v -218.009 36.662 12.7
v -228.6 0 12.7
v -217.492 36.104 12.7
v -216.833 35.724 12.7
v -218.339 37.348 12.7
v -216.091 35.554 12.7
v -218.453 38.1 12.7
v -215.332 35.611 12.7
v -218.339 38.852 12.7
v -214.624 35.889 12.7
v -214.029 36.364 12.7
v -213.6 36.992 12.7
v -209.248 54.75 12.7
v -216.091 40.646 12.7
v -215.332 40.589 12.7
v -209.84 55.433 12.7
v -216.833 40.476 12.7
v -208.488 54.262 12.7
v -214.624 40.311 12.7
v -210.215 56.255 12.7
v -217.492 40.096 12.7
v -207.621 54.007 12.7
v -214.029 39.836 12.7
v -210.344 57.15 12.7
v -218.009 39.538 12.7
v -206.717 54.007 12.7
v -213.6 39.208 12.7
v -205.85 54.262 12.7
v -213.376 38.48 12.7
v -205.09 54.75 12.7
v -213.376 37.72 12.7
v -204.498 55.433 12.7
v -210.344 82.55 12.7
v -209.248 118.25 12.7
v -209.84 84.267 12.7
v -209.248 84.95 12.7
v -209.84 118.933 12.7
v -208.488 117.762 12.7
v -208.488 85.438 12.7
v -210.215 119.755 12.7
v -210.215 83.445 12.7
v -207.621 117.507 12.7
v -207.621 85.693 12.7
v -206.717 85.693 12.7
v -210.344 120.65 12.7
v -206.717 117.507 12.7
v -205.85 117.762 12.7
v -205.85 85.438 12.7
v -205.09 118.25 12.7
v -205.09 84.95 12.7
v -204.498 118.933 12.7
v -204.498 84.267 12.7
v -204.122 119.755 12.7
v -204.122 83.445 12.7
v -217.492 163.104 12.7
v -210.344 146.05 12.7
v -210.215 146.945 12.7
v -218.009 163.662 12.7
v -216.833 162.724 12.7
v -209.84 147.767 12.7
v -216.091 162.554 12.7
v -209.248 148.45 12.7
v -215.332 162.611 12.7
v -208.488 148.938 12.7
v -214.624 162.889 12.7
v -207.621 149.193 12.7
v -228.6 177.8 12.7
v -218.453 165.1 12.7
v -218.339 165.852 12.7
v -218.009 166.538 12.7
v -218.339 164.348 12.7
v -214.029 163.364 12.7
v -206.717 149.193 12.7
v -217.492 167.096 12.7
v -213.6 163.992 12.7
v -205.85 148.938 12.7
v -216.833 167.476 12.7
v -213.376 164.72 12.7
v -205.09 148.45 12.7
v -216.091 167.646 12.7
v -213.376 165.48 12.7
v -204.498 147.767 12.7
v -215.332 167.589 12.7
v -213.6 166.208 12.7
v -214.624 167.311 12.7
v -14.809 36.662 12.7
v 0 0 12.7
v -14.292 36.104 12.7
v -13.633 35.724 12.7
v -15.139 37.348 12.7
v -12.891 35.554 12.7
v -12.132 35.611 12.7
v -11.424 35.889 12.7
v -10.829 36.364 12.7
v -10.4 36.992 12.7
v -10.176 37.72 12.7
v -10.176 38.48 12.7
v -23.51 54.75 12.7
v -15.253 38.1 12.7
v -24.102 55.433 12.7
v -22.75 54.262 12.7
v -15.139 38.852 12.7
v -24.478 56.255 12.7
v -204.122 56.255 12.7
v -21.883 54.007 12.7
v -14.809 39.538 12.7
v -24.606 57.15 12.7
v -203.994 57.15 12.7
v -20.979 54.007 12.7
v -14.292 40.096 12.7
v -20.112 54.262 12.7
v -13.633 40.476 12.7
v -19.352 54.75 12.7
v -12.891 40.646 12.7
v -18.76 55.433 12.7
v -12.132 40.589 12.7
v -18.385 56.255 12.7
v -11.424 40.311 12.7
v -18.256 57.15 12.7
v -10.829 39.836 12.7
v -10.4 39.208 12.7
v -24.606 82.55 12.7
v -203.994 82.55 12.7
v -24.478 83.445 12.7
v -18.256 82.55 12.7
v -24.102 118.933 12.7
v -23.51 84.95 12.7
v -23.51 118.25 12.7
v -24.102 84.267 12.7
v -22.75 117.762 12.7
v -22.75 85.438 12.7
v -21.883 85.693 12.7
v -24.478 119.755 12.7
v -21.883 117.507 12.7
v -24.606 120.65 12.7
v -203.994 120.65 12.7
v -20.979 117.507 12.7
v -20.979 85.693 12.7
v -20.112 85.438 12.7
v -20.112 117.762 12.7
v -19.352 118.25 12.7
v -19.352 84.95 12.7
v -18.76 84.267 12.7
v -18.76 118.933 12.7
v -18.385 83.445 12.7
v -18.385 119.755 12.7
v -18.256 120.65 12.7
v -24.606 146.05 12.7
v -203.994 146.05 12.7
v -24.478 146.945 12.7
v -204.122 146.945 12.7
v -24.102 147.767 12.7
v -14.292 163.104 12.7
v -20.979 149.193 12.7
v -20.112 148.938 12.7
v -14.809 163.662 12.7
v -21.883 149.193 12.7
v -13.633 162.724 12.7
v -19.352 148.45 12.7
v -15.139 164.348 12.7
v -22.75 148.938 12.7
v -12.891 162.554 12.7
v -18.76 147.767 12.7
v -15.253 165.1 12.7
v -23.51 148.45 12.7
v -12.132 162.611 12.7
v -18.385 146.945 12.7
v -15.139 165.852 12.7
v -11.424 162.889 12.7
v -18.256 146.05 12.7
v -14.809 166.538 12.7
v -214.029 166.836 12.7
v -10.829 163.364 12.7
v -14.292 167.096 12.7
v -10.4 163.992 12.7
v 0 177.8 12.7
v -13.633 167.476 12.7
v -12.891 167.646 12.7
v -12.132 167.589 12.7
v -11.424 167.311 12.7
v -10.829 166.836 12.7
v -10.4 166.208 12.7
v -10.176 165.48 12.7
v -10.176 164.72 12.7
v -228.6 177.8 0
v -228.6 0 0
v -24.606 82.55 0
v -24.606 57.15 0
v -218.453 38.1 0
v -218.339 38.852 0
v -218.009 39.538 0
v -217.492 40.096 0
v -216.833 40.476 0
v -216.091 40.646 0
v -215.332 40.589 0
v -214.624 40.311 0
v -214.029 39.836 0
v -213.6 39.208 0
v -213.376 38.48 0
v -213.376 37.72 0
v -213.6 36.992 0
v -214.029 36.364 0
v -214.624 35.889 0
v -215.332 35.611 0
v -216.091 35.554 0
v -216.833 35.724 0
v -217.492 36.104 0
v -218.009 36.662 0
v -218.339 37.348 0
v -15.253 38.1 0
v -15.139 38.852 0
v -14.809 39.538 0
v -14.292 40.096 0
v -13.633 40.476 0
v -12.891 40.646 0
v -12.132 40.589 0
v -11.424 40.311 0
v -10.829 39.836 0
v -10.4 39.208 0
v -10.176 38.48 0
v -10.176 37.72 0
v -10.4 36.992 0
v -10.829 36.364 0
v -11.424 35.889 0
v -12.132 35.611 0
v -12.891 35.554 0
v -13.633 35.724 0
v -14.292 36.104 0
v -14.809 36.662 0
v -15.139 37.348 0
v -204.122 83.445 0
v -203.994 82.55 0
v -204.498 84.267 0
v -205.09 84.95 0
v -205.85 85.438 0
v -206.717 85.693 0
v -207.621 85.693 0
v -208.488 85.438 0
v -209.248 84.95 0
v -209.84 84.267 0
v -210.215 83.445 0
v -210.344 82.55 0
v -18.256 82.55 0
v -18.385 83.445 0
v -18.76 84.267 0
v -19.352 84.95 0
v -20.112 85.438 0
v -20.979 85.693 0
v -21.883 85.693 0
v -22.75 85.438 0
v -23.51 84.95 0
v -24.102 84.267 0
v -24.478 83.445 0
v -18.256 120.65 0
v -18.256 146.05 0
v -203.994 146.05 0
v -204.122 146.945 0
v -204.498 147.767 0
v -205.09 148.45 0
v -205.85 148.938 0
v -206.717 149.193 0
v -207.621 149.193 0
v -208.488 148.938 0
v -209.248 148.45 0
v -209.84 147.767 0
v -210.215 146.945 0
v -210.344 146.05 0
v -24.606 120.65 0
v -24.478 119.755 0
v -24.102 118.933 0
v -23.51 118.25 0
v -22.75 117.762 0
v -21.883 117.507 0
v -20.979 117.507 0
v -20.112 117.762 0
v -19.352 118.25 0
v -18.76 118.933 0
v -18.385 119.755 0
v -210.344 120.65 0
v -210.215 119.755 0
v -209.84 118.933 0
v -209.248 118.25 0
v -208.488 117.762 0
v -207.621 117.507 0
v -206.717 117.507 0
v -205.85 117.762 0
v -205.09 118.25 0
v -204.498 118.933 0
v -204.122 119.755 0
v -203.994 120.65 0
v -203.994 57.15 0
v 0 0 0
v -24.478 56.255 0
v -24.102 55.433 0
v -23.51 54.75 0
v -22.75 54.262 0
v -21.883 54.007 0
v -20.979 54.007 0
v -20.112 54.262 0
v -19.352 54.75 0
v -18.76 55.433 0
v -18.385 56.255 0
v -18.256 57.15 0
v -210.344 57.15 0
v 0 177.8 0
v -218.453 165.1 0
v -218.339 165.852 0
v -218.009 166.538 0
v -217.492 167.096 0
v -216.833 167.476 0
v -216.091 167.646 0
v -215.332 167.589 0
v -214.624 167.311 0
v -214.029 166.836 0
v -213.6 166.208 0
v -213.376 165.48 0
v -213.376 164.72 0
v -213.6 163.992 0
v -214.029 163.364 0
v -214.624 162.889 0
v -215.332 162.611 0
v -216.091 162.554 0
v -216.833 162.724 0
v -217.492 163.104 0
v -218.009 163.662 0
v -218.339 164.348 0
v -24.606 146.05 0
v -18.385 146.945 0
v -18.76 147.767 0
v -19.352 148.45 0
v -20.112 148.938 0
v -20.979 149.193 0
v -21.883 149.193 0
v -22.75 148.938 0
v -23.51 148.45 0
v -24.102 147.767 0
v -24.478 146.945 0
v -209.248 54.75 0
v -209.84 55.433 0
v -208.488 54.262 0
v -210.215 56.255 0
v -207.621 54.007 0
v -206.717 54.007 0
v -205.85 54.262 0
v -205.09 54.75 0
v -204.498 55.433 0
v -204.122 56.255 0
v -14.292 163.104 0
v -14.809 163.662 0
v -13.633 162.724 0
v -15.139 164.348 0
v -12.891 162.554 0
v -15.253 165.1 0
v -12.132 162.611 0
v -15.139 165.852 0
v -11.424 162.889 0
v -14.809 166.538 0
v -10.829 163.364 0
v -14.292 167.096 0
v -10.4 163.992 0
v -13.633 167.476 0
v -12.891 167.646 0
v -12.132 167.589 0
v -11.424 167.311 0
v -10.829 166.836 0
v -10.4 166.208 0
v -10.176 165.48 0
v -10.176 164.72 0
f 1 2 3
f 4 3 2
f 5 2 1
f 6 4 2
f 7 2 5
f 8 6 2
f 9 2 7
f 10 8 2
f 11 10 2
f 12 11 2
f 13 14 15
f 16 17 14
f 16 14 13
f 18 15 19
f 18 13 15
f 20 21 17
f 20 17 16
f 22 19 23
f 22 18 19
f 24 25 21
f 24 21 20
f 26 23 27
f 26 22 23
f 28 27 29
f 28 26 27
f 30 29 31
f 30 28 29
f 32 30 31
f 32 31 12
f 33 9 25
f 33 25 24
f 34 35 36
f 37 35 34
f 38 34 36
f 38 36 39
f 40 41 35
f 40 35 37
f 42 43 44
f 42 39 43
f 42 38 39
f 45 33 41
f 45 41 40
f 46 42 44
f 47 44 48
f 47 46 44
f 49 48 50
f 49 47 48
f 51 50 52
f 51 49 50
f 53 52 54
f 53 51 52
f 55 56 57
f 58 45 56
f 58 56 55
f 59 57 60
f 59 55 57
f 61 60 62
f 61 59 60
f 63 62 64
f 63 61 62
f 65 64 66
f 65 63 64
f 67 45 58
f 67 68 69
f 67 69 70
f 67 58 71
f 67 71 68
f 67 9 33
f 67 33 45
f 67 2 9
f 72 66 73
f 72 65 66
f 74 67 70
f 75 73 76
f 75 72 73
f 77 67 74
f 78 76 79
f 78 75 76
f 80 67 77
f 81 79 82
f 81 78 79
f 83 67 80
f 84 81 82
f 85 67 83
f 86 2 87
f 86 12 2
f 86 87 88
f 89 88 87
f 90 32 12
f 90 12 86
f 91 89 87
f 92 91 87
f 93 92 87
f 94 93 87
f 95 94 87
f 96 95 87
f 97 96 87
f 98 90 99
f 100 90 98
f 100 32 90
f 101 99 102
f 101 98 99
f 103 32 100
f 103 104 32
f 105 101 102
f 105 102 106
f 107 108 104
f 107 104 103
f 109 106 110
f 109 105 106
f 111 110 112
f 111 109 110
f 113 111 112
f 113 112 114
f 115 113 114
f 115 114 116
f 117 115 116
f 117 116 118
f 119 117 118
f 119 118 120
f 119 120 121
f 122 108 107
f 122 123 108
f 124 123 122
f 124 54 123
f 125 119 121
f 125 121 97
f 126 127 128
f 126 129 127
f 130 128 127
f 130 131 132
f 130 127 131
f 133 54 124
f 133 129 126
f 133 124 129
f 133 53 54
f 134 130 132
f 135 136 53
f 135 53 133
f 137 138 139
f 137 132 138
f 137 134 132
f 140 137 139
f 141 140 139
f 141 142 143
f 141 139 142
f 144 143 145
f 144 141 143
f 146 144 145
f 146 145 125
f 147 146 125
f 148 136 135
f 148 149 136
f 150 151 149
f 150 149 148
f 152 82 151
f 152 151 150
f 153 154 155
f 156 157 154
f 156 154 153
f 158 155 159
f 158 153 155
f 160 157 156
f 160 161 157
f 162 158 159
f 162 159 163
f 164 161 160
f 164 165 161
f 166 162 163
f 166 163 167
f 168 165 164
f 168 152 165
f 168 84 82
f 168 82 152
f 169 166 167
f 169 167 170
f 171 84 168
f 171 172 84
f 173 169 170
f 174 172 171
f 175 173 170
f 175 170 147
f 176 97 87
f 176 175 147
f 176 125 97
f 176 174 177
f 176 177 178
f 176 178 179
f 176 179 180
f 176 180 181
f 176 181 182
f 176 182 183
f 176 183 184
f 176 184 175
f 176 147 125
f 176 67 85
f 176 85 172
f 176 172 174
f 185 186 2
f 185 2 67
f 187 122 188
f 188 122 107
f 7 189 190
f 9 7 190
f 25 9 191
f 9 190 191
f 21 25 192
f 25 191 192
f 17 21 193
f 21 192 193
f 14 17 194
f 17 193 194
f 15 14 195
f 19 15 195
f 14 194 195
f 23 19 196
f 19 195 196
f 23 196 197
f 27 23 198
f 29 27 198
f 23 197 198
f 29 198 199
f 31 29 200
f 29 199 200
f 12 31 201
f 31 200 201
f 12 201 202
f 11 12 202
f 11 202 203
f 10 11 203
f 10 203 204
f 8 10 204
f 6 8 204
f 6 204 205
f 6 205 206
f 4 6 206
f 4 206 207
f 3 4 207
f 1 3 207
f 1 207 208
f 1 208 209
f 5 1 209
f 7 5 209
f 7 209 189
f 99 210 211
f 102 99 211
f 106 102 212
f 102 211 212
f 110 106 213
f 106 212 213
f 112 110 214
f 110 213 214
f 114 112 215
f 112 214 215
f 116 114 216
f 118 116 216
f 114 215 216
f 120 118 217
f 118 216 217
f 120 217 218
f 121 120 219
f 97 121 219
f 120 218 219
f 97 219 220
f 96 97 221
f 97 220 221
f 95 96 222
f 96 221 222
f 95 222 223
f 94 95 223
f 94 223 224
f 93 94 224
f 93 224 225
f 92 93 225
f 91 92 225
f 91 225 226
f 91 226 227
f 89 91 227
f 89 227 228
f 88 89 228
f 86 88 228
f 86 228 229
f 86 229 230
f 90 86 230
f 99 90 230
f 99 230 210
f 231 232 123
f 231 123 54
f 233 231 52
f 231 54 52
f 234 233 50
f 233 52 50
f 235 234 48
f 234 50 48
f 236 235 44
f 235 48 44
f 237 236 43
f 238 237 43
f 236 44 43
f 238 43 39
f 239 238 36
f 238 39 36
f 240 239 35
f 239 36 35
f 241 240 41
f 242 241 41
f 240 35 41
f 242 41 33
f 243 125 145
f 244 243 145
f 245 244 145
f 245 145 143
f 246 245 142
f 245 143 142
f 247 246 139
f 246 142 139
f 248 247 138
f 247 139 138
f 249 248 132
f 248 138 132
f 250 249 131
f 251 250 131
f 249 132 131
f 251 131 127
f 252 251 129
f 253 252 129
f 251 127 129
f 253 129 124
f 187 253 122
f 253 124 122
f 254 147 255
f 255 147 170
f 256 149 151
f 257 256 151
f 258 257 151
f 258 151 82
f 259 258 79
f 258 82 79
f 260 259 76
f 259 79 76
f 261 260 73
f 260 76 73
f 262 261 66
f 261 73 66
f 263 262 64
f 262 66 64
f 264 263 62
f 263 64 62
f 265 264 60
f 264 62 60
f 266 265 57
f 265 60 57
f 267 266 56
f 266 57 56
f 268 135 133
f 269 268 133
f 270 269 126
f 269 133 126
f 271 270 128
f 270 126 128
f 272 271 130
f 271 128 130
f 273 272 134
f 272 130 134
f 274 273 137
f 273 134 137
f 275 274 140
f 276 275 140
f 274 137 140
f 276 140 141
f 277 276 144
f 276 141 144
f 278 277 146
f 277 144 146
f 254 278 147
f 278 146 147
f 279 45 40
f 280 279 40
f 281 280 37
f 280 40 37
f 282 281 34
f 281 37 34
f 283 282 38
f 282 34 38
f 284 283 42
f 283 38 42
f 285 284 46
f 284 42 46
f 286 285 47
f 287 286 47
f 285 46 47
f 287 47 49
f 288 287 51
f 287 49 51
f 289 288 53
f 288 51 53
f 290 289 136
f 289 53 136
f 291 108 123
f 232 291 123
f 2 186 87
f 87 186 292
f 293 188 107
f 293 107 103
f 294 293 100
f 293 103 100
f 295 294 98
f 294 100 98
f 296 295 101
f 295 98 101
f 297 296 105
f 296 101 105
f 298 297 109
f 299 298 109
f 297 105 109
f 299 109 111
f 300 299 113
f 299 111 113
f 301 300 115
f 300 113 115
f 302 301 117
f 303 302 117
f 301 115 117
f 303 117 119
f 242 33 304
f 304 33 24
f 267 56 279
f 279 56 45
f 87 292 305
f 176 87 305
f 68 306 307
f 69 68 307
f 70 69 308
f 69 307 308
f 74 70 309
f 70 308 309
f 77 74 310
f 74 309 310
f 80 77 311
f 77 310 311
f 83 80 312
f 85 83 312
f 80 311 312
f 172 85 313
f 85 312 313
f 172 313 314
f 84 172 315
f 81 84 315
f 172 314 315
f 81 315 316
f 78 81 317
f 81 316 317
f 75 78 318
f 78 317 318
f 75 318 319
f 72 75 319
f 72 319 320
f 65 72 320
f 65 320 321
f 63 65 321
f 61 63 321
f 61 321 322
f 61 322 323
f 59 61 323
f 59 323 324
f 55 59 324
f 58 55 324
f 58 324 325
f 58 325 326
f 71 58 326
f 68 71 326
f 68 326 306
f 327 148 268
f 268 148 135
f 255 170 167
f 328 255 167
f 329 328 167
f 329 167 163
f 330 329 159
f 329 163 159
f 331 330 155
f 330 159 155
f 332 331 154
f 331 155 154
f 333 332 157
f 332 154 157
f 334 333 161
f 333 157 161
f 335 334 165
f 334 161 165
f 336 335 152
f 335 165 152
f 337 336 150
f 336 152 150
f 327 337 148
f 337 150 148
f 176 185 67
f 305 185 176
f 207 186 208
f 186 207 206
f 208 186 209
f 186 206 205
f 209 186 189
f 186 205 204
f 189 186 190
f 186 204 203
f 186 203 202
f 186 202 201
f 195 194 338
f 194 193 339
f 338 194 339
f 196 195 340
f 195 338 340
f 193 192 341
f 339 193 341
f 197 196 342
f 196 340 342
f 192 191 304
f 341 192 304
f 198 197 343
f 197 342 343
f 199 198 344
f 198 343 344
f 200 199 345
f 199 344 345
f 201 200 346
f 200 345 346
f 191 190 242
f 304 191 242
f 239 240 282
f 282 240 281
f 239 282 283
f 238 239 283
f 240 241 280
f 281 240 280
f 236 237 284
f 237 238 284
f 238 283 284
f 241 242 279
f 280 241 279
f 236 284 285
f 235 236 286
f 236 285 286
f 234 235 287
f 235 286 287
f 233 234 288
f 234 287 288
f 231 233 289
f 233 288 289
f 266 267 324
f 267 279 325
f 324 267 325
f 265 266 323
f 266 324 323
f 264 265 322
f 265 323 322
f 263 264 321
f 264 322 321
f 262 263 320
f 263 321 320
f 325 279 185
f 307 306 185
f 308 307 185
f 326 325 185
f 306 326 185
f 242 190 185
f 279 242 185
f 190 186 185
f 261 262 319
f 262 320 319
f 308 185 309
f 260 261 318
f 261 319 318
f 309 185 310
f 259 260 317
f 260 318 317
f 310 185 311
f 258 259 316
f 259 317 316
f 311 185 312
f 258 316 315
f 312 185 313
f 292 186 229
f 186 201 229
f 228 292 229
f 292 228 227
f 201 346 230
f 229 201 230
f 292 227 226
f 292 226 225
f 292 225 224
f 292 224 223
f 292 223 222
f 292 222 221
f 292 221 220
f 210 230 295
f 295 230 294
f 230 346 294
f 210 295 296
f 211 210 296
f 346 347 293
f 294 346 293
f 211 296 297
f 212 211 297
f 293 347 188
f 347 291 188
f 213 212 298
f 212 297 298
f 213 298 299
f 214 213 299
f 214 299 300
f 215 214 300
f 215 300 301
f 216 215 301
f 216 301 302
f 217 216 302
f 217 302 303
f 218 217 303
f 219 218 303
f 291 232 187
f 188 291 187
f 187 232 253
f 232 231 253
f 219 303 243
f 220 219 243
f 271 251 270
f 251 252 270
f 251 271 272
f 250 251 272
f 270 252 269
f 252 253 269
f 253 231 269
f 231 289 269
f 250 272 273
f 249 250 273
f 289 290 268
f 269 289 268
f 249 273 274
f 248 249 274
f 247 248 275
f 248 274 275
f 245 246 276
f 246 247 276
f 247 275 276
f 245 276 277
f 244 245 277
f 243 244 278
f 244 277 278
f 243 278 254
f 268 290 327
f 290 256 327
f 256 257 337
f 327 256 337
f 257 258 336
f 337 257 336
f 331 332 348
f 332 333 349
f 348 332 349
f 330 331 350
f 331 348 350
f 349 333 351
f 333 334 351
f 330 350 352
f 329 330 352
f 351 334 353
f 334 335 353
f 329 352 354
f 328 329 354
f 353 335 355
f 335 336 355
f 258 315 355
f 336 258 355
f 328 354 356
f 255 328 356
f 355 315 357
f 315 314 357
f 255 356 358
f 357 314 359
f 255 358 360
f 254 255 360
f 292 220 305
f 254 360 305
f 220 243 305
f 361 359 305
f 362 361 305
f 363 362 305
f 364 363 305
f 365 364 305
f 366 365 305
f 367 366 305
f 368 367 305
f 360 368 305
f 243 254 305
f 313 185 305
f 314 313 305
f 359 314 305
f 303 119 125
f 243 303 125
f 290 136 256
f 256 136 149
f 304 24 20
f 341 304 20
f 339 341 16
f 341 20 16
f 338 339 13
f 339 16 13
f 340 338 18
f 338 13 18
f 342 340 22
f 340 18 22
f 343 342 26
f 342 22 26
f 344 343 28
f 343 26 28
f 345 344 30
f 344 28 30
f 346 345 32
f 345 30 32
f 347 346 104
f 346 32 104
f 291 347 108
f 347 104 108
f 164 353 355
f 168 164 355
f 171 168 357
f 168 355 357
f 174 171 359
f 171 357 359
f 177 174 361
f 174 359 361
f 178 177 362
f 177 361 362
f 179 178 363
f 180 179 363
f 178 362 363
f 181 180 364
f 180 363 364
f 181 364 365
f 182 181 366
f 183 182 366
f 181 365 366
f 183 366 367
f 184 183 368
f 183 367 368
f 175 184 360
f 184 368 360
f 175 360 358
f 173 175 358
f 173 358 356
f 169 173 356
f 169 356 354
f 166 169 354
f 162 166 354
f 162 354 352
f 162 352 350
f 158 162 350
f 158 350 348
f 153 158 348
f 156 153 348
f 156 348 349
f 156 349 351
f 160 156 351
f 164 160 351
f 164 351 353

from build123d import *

# Parameters (mm, degrees)
F0_W     = 228.6
F0_H     = 177.8
F1_DEPTH = 12.7
F3_D     = 5.1054
F5_DEPTH = 12.701


with BuildPart() as f1:
    # F0 (on Top) → F1 (new body)
    with BuildSketch(Plane.XY):
        with Locations((-114.3, 88.9)):
            Rectangle(F0_W, F0_H)
    extrude(amount=F1_DEPTH)

    # F3 (through all)
    with Locations(Plane.XY.offset(12.7)):
        with Locations((-12.7, 38.1), (-12.7, 165.1), (-215.9, 38.1), (-215.9, 165.1)):
            Hole(F3_D / 2)

    # F4 (on face) → F5 (cut, through all)
    with BuildSketch(Plane.XY.offset(12.7)):
        with BuildLine():
            ThreePointArc((-24.60625, 120.65), (-21.43125, 117.475), (-18.25625, 120.65))
            Line((-18.25625, 120.65), (-18.25625, 146.05))
            ThreePointArc((-18.25625, 146.05), (-21.43125, 149.225), (-24.60625, 146.05))
            Line((-24.60625, 146.05), (-24.60625, 120.65))
        make_face()
        with BuildLine():
            ThreePointArc((-18.25625, 82.55), (-21.43125, 85.725), (-24.60625, 82.55))
            Line((-24.60625, 82.55), (-24.60625, 57.15))
            ThreePointArc((-24.60625, 57.15), (-21.43125, 53.975), (-18.25625, 57.15))
            Line((-18.25625, 57.15), (-18.25625, 82.55))
        make_face()
        with BuildLine():
            Line((-203.99375, 120.65), (-203.99375, 146.05))
            ThreePointArc((-203.99375, 146.05), (-207.16875, 149.225), (-210.34375, 146.05))
            Line((-210.34375, 146.05), (-210.34375, 120.65))
            ThreePointArc((-210.34375, 120.65), (-207.16875, 117.475), (-203.99375, 120.65))
        make_face()
        with BuildLine():
            ThreePointArc((-210.34375, 57.15), (-207.16875, 53.975), (-203.99375, 57.15))
            Line((-203.99375, 57.15), (-203.99375, 82.55))
            ThreePointArc((-203.99375, 82.55), (-207.16875, 85.725), (-210.34375, 82.55))
            Line((-210.34375, 82.55), (-210.34375, 57.15))
        make_face()
    extrude(amount=-F5_DEPTH, mode=Mode.SUBTRACT)


solid = f1.part
